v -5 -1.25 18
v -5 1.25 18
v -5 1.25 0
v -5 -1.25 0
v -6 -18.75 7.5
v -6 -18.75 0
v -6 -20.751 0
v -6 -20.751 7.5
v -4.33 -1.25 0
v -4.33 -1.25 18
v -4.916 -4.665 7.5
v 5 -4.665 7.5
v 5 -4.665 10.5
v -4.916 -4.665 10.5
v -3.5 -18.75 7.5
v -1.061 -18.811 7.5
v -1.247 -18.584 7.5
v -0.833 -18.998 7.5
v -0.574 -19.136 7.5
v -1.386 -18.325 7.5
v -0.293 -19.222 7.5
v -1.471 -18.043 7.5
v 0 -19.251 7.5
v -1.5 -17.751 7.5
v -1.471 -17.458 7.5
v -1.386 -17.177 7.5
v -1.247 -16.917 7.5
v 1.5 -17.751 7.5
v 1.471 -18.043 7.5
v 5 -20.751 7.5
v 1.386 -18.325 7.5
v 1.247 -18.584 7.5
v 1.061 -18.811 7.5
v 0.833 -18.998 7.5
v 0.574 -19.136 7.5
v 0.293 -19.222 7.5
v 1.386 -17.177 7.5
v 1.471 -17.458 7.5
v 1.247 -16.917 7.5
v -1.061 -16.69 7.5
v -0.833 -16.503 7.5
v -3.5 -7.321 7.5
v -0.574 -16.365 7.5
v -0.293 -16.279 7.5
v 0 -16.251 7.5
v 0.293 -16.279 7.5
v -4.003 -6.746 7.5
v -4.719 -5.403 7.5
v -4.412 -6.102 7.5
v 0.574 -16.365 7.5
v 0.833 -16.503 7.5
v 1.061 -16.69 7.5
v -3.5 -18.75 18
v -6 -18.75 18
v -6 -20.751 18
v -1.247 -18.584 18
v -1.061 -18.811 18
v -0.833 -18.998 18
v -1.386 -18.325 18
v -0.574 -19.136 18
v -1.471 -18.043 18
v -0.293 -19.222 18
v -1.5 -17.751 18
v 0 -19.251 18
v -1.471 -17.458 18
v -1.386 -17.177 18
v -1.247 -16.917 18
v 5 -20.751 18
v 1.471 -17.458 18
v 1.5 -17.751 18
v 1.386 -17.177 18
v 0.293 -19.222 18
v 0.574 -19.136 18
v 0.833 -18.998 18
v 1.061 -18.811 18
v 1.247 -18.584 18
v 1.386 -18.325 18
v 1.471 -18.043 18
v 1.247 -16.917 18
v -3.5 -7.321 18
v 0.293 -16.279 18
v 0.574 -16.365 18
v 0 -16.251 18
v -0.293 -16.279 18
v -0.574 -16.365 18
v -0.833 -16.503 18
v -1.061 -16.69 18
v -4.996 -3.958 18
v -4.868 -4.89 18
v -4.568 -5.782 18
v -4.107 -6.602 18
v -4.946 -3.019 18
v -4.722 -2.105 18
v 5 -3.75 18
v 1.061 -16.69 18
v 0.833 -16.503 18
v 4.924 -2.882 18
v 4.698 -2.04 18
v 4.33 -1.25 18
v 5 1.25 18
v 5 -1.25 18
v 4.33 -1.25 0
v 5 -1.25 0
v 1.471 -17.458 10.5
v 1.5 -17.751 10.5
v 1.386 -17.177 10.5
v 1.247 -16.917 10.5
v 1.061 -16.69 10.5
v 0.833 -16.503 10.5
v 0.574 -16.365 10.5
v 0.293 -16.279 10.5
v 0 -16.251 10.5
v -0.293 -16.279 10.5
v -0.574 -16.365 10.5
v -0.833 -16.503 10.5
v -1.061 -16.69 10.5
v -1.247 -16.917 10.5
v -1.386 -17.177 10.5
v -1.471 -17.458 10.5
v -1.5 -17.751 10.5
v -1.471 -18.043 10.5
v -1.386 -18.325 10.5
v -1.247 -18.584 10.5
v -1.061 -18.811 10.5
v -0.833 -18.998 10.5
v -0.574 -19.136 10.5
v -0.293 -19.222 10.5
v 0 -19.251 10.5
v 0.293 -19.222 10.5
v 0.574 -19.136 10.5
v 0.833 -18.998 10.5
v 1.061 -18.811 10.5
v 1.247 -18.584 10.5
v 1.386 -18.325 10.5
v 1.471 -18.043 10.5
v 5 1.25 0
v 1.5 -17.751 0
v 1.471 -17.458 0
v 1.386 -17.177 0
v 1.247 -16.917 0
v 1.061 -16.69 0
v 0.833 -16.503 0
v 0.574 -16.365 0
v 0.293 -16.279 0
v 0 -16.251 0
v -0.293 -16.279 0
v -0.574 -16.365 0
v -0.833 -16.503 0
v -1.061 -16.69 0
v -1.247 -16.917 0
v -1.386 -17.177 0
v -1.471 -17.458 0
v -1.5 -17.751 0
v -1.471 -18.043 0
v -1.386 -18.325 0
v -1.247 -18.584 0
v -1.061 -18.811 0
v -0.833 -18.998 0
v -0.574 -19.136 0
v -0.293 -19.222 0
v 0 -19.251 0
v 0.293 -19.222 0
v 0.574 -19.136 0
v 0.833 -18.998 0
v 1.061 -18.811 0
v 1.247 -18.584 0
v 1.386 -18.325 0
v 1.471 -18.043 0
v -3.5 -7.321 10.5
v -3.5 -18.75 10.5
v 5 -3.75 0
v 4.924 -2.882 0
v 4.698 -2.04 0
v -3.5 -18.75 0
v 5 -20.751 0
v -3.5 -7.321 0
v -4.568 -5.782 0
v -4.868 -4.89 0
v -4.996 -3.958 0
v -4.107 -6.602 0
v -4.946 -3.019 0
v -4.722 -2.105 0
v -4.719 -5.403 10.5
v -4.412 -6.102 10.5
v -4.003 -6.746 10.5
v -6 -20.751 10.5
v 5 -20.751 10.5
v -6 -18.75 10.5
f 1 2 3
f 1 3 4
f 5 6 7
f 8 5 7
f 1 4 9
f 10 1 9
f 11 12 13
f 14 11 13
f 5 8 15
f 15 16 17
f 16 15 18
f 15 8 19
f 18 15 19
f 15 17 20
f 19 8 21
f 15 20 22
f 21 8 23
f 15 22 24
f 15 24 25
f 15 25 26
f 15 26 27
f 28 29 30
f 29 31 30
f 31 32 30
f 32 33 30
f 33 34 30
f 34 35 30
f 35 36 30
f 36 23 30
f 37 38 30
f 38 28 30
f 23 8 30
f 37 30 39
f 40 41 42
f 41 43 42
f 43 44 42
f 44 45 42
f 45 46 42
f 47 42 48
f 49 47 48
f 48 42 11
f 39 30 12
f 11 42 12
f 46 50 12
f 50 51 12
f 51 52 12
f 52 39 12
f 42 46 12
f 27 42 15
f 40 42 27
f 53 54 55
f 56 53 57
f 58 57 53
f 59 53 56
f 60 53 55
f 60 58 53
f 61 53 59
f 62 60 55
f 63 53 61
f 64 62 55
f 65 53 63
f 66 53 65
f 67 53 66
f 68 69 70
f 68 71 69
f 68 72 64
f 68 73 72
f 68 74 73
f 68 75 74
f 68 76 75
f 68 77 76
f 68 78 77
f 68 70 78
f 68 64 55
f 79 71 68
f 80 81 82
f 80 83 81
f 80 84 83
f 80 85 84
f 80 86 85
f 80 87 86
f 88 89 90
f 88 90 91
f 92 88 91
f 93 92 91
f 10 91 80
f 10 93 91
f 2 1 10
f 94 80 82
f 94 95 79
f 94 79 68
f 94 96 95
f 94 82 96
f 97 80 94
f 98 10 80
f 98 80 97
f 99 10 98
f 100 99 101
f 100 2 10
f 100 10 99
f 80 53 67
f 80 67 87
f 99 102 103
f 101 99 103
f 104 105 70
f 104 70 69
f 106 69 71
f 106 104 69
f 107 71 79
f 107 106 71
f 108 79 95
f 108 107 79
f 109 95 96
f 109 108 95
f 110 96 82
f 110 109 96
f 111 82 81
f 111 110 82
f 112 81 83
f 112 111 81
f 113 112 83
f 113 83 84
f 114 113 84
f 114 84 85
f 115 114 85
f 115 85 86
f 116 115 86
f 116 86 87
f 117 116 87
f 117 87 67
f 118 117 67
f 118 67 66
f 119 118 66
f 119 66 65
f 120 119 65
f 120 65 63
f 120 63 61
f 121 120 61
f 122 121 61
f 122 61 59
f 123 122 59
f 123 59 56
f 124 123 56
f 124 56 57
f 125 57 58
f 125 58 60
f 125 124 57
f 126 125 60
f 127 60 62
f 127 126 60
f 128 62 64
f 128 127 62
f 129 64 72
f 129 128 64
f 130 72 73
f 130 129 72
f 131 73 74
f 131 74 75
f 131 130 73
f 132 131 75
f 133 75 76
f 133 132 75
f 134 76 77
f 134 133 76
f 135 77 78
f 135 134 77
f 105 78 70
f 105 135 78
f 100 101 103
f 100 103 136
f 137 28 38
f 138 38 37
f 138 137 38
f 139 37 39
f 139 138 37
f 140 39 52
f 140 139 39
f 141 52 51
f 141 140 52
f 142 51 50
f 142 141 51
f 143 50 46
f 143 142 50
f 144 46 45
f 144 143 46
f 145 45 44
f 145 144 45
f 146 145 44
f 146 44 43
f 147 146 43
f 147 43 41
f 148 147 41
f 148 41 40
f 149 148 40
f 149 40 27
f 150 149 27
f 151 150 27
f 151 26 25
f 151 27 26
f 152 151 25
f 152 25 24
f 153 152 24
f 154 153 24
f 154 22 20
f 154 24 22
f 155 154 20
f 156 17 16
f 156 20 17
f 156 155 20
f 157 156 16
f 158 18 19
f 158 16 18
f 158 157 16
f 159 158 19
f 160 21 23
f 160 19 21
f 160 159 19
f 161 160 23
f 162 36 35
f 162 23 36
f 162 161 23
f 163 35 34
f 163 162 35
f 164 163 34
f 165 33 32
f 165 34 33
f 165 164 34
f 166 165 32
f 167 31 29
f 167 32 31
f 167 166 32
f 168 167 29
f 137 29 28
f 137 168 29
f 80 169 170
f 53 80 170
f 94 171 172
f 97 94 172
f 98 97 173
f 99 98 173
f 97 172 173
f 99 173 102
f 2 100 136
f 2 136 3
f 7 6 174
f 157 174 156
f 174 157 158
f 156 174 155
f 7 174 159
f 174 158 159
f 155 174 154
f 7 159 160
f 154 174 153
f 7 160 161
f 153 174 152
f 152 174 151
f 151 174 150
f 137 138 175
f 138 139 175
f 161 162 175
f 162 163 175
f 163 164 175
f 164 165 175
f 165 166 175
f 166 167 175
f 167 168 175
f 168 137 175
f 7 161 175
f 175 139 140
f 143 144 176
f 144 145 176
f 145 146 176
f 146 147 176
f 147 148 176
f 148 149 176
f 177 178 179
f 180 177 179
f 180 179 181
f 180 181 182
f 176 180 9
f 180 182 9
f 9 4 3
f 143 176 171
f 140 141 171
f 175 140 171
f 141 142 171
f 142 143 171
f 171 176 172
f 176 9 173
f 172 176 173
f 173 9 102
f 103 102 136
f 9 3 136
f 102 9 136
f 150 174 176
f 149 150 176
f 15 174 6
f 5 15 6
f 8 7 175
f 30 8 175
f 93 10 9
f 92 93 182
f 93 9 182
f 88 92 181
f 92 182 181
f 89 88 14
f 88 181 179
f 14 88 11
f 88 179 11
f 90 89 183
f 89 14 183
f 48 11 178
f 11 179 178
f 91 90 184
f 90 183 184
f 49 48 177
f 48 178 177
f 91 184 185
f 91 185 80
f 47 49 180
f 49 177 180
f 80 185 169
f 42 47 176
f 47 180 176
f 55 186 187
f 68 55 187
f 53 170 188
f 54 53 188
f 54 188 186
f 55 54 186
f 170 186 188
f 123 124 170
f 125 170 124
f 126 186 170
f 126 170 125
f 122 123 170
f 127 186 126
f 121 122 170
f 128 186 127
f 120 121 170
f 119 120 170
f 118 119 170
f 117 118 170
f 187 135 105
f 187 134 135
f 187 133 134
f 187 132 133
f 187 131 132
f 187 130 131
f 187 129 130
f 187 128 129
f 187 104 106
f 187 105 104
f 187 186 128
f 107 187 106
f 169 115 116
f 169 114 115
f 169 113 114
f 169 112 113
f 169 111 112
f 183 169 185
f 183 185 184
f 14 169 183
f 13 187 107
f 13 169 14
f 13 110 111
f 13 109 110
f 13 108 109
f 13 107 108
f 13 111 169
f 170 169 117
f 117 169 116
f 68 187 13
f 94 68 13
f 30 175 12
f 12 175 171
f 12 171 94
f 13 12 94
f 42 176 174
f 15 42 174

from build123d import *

# Parameters (mm, degrees)
F0_R     = 1.5
F1_DEPTH = 18
F2_W     = 16.085666
F2_H     = 3
F3_DEPTH = 11


with BuildPart() as f1:
    # F0 (on Top) → F1 (new body)
    with BuildSketch(Plane.XY):
        with BuildLine():
            Line((4.330127, -1.25), (5, -1.25))
            Line((5, -1.25), (5, 1.25))
            Line((5, 1.25), (-5, 1.25))
            Line((-5, 1.25), (-5, -1.25))
            Line((-5, -1.25), (-4.330127, -1.25))
            ThreePointArc((-4.330127, -1.25), (-4.953899, -4.42741), (-3.5, -7.320714))
            Line((-3.5, -7.320714), (-3.5, -18.75))
            Line((-3.5, -18.75), (-6, -18.75))
            Line((-6, -18.75), (-6, -20.75058))
            Line((-6, -20.75058), (5, -20.75058))
            Line((5, -20.75058), (5, -18.75))
            Line((5, -18.75), (5, -3.75))
            ThreePointArc((5, -3.75), (4.829629, -2.455905), (4.330127, -1.25))
        make_face()
        with Locations((0, -17.75058)):
            Circle(F0_R, mode=Mode.SUBTRACT)
    extrude(amount=F1_DEPTH)

    # F2 (on face) → F3 (cut)
    with BuildSketch(Plane.YZ.offset(5)):
        with Locations((-12.707747, 9)):
            Rectangle(F2_W, F2_H)
    extrude(amount=-F3_DEPTH, mode=Mode.SUBTRACT)


solid = f1.part
